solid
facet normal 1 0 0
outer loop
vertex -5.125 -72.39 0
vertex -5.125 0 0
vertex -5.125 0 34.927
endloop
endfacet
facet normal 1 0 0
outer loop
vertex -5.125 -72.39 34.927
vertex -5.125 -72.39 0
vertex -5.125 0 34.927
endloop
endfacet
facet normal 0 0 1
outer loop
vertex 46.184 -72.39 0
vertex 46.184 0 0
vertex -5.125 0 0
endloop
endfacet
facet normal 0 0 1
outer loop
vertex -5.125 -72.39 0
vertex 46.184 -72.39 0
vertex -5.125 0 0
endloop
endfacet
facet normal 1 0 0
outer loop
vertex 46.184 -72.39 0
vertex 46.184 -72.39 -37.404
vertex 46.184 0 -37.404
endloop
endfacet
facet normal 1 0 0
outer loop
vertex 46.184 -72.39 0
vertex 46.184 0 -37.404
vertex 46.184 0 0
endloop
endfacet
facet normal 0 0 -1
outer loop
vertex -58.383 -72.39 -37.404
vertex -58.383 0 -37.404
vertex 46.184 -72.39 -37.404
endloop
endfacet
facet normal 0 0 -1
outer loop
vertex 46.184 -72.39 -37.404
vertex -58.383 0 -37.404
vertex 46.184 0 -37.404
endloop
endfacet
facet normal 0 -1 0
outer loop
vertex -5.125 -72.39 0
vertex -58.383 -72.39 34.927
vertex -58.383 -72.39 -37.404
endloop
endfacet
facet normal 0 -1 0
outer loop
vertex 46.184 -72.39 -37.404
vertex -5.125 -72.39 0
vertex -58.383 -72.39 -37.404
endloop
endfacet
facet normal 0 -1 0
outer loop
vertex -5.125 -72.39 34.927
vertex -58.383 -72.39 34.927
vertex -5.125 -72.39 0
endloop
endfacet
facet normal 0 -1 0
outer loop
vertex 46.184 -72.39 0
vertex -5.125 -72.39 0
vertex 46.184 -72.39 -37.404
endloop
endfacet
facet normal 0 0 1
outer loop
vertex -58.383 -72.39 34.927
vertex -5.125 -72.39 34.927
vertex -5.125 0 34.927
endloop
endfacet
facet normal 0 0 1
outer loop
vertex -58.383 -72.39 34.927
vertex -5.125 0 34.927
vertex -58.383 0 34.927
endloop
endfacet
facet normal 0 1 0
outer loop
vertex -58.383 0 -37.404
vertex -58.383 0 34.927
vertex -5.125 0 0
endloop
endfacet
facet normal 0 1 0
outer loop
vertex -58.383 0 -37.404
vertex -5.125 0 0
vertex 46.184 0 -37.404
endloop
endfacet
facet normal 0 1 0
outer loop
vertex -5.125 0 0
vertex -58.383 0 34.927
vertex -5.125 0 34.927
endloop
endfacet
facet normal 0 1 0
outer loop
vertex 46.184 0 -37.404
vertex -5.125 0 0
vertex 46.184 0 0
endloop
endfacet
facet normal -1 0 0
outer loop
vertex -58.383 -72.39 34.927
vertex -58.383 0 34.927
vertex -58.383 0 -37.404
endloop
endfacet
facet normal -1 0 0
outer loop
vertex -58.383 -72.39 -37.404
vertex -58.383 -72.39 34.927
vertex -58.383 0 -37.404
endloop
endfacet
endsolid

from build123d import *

# Parameters (mm, degrees)
F1_DEPTH = 25.4
F2_DEPTH = 67.818
F3_DEPTH = 20.828
F4_DEPTH = 8.636


with BuildPart() as f1:
    # F0 (on Front) → F1 (new body)
    with BuildSketch(Plane.XZ):
        Polygon((54.8201352358, 0), (-5.1254355349, 0), (-5.1254355349, 34.9269658327), (-58.3828687668, 34.9269658327), (-58.3828687668, -37.4040566385), (54.8201352358, -37.4040566385), align=None)
    extrude(amount=F1_DEPTH)

    # F2 (add): a face of the model
    f2_faces = [f1.faces().sort_by_distance(p)[0] for p in [
        (-10.92964208, -25.4, -7.6636129895),
    ]]
    extrude(f2_faces, amount=F2_DEPTH)

    # F3 (cut): a face of the model
    f3_faces = [f1.faces().sort_by_distance(p)[0] for p in [
        (-10.92964208, -93.218, -7.6636129895),
    ]]
    extrude(f3_faces, amount=-F3_DEPTH, mode=Mode.SUBTRACT)

    # F4 (cut): a face of the model
    f4_faces = [f1.faces().sort_by_distance(p)[0] for p in [
        (54.8201352358, -36.195, -18.7020283192),
    ]]
    extrude(f4_faces, amount=-F4_DEPTH, mode=Mode.SUBTRACT)


solid = f1.part
